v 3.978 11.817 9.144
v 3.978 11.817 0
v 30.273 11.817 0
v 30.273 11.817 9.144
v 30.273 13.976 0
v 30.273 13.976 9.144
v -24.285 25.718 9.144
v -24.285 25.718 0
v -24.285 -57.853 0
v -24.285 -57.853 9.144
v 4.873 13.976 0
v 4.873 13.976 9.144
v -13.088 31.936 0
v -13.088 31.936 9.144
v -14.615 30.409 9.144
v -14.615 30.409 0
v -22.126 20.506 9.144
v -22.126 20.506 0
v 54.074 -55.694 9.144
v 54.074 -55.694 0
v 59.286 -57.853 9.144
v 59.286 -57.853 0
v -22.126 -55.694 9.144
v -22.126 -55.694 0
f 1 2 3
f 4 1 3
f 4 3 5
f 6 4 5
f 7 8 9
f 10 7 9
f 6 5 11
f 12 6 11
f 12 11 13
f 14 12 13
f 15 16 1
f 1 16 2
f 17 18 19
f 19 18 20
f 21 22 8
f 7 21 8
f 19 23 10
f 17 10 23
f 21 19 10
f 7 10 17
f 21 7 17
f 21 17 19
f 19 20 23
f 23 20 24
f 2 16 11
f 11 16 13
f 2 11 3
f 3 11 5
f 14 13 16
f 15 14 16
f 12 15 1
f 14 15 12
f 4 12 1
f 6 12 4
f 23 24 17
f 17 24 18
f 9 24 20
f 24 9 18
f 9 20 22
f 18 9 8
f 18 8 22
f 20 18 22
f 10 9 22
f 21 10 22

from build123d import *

# Parameters (mm, degrees)
F1_DEPTH = 9.144


with BuildPart() as f1:
    # F0 (on Top) → F1 (new body)
    with BuildSketch(Plane.XY):
        Polygon((3.978267, 11.816577), (30.272554, 11.816577), (30.272554, 13.975577), (4.872554, 13.975577), (-13.087958, 31.93609), (-14.614602, 30.409446), align=None)
        Polygon((-24.285163, -57.853486), (59.286124, -57.853486), (-24.285163, 25.717801), (-24.285163, -55.694486), align=None)
        Polygon((54.073837, -55.694486), (-22.126163, -55.694486), (-22.126163, 20.505514), align=None, mode=Mode.SUBTRACT)
    extrude(amount=F1_DEPTH)


solid = f1.part
